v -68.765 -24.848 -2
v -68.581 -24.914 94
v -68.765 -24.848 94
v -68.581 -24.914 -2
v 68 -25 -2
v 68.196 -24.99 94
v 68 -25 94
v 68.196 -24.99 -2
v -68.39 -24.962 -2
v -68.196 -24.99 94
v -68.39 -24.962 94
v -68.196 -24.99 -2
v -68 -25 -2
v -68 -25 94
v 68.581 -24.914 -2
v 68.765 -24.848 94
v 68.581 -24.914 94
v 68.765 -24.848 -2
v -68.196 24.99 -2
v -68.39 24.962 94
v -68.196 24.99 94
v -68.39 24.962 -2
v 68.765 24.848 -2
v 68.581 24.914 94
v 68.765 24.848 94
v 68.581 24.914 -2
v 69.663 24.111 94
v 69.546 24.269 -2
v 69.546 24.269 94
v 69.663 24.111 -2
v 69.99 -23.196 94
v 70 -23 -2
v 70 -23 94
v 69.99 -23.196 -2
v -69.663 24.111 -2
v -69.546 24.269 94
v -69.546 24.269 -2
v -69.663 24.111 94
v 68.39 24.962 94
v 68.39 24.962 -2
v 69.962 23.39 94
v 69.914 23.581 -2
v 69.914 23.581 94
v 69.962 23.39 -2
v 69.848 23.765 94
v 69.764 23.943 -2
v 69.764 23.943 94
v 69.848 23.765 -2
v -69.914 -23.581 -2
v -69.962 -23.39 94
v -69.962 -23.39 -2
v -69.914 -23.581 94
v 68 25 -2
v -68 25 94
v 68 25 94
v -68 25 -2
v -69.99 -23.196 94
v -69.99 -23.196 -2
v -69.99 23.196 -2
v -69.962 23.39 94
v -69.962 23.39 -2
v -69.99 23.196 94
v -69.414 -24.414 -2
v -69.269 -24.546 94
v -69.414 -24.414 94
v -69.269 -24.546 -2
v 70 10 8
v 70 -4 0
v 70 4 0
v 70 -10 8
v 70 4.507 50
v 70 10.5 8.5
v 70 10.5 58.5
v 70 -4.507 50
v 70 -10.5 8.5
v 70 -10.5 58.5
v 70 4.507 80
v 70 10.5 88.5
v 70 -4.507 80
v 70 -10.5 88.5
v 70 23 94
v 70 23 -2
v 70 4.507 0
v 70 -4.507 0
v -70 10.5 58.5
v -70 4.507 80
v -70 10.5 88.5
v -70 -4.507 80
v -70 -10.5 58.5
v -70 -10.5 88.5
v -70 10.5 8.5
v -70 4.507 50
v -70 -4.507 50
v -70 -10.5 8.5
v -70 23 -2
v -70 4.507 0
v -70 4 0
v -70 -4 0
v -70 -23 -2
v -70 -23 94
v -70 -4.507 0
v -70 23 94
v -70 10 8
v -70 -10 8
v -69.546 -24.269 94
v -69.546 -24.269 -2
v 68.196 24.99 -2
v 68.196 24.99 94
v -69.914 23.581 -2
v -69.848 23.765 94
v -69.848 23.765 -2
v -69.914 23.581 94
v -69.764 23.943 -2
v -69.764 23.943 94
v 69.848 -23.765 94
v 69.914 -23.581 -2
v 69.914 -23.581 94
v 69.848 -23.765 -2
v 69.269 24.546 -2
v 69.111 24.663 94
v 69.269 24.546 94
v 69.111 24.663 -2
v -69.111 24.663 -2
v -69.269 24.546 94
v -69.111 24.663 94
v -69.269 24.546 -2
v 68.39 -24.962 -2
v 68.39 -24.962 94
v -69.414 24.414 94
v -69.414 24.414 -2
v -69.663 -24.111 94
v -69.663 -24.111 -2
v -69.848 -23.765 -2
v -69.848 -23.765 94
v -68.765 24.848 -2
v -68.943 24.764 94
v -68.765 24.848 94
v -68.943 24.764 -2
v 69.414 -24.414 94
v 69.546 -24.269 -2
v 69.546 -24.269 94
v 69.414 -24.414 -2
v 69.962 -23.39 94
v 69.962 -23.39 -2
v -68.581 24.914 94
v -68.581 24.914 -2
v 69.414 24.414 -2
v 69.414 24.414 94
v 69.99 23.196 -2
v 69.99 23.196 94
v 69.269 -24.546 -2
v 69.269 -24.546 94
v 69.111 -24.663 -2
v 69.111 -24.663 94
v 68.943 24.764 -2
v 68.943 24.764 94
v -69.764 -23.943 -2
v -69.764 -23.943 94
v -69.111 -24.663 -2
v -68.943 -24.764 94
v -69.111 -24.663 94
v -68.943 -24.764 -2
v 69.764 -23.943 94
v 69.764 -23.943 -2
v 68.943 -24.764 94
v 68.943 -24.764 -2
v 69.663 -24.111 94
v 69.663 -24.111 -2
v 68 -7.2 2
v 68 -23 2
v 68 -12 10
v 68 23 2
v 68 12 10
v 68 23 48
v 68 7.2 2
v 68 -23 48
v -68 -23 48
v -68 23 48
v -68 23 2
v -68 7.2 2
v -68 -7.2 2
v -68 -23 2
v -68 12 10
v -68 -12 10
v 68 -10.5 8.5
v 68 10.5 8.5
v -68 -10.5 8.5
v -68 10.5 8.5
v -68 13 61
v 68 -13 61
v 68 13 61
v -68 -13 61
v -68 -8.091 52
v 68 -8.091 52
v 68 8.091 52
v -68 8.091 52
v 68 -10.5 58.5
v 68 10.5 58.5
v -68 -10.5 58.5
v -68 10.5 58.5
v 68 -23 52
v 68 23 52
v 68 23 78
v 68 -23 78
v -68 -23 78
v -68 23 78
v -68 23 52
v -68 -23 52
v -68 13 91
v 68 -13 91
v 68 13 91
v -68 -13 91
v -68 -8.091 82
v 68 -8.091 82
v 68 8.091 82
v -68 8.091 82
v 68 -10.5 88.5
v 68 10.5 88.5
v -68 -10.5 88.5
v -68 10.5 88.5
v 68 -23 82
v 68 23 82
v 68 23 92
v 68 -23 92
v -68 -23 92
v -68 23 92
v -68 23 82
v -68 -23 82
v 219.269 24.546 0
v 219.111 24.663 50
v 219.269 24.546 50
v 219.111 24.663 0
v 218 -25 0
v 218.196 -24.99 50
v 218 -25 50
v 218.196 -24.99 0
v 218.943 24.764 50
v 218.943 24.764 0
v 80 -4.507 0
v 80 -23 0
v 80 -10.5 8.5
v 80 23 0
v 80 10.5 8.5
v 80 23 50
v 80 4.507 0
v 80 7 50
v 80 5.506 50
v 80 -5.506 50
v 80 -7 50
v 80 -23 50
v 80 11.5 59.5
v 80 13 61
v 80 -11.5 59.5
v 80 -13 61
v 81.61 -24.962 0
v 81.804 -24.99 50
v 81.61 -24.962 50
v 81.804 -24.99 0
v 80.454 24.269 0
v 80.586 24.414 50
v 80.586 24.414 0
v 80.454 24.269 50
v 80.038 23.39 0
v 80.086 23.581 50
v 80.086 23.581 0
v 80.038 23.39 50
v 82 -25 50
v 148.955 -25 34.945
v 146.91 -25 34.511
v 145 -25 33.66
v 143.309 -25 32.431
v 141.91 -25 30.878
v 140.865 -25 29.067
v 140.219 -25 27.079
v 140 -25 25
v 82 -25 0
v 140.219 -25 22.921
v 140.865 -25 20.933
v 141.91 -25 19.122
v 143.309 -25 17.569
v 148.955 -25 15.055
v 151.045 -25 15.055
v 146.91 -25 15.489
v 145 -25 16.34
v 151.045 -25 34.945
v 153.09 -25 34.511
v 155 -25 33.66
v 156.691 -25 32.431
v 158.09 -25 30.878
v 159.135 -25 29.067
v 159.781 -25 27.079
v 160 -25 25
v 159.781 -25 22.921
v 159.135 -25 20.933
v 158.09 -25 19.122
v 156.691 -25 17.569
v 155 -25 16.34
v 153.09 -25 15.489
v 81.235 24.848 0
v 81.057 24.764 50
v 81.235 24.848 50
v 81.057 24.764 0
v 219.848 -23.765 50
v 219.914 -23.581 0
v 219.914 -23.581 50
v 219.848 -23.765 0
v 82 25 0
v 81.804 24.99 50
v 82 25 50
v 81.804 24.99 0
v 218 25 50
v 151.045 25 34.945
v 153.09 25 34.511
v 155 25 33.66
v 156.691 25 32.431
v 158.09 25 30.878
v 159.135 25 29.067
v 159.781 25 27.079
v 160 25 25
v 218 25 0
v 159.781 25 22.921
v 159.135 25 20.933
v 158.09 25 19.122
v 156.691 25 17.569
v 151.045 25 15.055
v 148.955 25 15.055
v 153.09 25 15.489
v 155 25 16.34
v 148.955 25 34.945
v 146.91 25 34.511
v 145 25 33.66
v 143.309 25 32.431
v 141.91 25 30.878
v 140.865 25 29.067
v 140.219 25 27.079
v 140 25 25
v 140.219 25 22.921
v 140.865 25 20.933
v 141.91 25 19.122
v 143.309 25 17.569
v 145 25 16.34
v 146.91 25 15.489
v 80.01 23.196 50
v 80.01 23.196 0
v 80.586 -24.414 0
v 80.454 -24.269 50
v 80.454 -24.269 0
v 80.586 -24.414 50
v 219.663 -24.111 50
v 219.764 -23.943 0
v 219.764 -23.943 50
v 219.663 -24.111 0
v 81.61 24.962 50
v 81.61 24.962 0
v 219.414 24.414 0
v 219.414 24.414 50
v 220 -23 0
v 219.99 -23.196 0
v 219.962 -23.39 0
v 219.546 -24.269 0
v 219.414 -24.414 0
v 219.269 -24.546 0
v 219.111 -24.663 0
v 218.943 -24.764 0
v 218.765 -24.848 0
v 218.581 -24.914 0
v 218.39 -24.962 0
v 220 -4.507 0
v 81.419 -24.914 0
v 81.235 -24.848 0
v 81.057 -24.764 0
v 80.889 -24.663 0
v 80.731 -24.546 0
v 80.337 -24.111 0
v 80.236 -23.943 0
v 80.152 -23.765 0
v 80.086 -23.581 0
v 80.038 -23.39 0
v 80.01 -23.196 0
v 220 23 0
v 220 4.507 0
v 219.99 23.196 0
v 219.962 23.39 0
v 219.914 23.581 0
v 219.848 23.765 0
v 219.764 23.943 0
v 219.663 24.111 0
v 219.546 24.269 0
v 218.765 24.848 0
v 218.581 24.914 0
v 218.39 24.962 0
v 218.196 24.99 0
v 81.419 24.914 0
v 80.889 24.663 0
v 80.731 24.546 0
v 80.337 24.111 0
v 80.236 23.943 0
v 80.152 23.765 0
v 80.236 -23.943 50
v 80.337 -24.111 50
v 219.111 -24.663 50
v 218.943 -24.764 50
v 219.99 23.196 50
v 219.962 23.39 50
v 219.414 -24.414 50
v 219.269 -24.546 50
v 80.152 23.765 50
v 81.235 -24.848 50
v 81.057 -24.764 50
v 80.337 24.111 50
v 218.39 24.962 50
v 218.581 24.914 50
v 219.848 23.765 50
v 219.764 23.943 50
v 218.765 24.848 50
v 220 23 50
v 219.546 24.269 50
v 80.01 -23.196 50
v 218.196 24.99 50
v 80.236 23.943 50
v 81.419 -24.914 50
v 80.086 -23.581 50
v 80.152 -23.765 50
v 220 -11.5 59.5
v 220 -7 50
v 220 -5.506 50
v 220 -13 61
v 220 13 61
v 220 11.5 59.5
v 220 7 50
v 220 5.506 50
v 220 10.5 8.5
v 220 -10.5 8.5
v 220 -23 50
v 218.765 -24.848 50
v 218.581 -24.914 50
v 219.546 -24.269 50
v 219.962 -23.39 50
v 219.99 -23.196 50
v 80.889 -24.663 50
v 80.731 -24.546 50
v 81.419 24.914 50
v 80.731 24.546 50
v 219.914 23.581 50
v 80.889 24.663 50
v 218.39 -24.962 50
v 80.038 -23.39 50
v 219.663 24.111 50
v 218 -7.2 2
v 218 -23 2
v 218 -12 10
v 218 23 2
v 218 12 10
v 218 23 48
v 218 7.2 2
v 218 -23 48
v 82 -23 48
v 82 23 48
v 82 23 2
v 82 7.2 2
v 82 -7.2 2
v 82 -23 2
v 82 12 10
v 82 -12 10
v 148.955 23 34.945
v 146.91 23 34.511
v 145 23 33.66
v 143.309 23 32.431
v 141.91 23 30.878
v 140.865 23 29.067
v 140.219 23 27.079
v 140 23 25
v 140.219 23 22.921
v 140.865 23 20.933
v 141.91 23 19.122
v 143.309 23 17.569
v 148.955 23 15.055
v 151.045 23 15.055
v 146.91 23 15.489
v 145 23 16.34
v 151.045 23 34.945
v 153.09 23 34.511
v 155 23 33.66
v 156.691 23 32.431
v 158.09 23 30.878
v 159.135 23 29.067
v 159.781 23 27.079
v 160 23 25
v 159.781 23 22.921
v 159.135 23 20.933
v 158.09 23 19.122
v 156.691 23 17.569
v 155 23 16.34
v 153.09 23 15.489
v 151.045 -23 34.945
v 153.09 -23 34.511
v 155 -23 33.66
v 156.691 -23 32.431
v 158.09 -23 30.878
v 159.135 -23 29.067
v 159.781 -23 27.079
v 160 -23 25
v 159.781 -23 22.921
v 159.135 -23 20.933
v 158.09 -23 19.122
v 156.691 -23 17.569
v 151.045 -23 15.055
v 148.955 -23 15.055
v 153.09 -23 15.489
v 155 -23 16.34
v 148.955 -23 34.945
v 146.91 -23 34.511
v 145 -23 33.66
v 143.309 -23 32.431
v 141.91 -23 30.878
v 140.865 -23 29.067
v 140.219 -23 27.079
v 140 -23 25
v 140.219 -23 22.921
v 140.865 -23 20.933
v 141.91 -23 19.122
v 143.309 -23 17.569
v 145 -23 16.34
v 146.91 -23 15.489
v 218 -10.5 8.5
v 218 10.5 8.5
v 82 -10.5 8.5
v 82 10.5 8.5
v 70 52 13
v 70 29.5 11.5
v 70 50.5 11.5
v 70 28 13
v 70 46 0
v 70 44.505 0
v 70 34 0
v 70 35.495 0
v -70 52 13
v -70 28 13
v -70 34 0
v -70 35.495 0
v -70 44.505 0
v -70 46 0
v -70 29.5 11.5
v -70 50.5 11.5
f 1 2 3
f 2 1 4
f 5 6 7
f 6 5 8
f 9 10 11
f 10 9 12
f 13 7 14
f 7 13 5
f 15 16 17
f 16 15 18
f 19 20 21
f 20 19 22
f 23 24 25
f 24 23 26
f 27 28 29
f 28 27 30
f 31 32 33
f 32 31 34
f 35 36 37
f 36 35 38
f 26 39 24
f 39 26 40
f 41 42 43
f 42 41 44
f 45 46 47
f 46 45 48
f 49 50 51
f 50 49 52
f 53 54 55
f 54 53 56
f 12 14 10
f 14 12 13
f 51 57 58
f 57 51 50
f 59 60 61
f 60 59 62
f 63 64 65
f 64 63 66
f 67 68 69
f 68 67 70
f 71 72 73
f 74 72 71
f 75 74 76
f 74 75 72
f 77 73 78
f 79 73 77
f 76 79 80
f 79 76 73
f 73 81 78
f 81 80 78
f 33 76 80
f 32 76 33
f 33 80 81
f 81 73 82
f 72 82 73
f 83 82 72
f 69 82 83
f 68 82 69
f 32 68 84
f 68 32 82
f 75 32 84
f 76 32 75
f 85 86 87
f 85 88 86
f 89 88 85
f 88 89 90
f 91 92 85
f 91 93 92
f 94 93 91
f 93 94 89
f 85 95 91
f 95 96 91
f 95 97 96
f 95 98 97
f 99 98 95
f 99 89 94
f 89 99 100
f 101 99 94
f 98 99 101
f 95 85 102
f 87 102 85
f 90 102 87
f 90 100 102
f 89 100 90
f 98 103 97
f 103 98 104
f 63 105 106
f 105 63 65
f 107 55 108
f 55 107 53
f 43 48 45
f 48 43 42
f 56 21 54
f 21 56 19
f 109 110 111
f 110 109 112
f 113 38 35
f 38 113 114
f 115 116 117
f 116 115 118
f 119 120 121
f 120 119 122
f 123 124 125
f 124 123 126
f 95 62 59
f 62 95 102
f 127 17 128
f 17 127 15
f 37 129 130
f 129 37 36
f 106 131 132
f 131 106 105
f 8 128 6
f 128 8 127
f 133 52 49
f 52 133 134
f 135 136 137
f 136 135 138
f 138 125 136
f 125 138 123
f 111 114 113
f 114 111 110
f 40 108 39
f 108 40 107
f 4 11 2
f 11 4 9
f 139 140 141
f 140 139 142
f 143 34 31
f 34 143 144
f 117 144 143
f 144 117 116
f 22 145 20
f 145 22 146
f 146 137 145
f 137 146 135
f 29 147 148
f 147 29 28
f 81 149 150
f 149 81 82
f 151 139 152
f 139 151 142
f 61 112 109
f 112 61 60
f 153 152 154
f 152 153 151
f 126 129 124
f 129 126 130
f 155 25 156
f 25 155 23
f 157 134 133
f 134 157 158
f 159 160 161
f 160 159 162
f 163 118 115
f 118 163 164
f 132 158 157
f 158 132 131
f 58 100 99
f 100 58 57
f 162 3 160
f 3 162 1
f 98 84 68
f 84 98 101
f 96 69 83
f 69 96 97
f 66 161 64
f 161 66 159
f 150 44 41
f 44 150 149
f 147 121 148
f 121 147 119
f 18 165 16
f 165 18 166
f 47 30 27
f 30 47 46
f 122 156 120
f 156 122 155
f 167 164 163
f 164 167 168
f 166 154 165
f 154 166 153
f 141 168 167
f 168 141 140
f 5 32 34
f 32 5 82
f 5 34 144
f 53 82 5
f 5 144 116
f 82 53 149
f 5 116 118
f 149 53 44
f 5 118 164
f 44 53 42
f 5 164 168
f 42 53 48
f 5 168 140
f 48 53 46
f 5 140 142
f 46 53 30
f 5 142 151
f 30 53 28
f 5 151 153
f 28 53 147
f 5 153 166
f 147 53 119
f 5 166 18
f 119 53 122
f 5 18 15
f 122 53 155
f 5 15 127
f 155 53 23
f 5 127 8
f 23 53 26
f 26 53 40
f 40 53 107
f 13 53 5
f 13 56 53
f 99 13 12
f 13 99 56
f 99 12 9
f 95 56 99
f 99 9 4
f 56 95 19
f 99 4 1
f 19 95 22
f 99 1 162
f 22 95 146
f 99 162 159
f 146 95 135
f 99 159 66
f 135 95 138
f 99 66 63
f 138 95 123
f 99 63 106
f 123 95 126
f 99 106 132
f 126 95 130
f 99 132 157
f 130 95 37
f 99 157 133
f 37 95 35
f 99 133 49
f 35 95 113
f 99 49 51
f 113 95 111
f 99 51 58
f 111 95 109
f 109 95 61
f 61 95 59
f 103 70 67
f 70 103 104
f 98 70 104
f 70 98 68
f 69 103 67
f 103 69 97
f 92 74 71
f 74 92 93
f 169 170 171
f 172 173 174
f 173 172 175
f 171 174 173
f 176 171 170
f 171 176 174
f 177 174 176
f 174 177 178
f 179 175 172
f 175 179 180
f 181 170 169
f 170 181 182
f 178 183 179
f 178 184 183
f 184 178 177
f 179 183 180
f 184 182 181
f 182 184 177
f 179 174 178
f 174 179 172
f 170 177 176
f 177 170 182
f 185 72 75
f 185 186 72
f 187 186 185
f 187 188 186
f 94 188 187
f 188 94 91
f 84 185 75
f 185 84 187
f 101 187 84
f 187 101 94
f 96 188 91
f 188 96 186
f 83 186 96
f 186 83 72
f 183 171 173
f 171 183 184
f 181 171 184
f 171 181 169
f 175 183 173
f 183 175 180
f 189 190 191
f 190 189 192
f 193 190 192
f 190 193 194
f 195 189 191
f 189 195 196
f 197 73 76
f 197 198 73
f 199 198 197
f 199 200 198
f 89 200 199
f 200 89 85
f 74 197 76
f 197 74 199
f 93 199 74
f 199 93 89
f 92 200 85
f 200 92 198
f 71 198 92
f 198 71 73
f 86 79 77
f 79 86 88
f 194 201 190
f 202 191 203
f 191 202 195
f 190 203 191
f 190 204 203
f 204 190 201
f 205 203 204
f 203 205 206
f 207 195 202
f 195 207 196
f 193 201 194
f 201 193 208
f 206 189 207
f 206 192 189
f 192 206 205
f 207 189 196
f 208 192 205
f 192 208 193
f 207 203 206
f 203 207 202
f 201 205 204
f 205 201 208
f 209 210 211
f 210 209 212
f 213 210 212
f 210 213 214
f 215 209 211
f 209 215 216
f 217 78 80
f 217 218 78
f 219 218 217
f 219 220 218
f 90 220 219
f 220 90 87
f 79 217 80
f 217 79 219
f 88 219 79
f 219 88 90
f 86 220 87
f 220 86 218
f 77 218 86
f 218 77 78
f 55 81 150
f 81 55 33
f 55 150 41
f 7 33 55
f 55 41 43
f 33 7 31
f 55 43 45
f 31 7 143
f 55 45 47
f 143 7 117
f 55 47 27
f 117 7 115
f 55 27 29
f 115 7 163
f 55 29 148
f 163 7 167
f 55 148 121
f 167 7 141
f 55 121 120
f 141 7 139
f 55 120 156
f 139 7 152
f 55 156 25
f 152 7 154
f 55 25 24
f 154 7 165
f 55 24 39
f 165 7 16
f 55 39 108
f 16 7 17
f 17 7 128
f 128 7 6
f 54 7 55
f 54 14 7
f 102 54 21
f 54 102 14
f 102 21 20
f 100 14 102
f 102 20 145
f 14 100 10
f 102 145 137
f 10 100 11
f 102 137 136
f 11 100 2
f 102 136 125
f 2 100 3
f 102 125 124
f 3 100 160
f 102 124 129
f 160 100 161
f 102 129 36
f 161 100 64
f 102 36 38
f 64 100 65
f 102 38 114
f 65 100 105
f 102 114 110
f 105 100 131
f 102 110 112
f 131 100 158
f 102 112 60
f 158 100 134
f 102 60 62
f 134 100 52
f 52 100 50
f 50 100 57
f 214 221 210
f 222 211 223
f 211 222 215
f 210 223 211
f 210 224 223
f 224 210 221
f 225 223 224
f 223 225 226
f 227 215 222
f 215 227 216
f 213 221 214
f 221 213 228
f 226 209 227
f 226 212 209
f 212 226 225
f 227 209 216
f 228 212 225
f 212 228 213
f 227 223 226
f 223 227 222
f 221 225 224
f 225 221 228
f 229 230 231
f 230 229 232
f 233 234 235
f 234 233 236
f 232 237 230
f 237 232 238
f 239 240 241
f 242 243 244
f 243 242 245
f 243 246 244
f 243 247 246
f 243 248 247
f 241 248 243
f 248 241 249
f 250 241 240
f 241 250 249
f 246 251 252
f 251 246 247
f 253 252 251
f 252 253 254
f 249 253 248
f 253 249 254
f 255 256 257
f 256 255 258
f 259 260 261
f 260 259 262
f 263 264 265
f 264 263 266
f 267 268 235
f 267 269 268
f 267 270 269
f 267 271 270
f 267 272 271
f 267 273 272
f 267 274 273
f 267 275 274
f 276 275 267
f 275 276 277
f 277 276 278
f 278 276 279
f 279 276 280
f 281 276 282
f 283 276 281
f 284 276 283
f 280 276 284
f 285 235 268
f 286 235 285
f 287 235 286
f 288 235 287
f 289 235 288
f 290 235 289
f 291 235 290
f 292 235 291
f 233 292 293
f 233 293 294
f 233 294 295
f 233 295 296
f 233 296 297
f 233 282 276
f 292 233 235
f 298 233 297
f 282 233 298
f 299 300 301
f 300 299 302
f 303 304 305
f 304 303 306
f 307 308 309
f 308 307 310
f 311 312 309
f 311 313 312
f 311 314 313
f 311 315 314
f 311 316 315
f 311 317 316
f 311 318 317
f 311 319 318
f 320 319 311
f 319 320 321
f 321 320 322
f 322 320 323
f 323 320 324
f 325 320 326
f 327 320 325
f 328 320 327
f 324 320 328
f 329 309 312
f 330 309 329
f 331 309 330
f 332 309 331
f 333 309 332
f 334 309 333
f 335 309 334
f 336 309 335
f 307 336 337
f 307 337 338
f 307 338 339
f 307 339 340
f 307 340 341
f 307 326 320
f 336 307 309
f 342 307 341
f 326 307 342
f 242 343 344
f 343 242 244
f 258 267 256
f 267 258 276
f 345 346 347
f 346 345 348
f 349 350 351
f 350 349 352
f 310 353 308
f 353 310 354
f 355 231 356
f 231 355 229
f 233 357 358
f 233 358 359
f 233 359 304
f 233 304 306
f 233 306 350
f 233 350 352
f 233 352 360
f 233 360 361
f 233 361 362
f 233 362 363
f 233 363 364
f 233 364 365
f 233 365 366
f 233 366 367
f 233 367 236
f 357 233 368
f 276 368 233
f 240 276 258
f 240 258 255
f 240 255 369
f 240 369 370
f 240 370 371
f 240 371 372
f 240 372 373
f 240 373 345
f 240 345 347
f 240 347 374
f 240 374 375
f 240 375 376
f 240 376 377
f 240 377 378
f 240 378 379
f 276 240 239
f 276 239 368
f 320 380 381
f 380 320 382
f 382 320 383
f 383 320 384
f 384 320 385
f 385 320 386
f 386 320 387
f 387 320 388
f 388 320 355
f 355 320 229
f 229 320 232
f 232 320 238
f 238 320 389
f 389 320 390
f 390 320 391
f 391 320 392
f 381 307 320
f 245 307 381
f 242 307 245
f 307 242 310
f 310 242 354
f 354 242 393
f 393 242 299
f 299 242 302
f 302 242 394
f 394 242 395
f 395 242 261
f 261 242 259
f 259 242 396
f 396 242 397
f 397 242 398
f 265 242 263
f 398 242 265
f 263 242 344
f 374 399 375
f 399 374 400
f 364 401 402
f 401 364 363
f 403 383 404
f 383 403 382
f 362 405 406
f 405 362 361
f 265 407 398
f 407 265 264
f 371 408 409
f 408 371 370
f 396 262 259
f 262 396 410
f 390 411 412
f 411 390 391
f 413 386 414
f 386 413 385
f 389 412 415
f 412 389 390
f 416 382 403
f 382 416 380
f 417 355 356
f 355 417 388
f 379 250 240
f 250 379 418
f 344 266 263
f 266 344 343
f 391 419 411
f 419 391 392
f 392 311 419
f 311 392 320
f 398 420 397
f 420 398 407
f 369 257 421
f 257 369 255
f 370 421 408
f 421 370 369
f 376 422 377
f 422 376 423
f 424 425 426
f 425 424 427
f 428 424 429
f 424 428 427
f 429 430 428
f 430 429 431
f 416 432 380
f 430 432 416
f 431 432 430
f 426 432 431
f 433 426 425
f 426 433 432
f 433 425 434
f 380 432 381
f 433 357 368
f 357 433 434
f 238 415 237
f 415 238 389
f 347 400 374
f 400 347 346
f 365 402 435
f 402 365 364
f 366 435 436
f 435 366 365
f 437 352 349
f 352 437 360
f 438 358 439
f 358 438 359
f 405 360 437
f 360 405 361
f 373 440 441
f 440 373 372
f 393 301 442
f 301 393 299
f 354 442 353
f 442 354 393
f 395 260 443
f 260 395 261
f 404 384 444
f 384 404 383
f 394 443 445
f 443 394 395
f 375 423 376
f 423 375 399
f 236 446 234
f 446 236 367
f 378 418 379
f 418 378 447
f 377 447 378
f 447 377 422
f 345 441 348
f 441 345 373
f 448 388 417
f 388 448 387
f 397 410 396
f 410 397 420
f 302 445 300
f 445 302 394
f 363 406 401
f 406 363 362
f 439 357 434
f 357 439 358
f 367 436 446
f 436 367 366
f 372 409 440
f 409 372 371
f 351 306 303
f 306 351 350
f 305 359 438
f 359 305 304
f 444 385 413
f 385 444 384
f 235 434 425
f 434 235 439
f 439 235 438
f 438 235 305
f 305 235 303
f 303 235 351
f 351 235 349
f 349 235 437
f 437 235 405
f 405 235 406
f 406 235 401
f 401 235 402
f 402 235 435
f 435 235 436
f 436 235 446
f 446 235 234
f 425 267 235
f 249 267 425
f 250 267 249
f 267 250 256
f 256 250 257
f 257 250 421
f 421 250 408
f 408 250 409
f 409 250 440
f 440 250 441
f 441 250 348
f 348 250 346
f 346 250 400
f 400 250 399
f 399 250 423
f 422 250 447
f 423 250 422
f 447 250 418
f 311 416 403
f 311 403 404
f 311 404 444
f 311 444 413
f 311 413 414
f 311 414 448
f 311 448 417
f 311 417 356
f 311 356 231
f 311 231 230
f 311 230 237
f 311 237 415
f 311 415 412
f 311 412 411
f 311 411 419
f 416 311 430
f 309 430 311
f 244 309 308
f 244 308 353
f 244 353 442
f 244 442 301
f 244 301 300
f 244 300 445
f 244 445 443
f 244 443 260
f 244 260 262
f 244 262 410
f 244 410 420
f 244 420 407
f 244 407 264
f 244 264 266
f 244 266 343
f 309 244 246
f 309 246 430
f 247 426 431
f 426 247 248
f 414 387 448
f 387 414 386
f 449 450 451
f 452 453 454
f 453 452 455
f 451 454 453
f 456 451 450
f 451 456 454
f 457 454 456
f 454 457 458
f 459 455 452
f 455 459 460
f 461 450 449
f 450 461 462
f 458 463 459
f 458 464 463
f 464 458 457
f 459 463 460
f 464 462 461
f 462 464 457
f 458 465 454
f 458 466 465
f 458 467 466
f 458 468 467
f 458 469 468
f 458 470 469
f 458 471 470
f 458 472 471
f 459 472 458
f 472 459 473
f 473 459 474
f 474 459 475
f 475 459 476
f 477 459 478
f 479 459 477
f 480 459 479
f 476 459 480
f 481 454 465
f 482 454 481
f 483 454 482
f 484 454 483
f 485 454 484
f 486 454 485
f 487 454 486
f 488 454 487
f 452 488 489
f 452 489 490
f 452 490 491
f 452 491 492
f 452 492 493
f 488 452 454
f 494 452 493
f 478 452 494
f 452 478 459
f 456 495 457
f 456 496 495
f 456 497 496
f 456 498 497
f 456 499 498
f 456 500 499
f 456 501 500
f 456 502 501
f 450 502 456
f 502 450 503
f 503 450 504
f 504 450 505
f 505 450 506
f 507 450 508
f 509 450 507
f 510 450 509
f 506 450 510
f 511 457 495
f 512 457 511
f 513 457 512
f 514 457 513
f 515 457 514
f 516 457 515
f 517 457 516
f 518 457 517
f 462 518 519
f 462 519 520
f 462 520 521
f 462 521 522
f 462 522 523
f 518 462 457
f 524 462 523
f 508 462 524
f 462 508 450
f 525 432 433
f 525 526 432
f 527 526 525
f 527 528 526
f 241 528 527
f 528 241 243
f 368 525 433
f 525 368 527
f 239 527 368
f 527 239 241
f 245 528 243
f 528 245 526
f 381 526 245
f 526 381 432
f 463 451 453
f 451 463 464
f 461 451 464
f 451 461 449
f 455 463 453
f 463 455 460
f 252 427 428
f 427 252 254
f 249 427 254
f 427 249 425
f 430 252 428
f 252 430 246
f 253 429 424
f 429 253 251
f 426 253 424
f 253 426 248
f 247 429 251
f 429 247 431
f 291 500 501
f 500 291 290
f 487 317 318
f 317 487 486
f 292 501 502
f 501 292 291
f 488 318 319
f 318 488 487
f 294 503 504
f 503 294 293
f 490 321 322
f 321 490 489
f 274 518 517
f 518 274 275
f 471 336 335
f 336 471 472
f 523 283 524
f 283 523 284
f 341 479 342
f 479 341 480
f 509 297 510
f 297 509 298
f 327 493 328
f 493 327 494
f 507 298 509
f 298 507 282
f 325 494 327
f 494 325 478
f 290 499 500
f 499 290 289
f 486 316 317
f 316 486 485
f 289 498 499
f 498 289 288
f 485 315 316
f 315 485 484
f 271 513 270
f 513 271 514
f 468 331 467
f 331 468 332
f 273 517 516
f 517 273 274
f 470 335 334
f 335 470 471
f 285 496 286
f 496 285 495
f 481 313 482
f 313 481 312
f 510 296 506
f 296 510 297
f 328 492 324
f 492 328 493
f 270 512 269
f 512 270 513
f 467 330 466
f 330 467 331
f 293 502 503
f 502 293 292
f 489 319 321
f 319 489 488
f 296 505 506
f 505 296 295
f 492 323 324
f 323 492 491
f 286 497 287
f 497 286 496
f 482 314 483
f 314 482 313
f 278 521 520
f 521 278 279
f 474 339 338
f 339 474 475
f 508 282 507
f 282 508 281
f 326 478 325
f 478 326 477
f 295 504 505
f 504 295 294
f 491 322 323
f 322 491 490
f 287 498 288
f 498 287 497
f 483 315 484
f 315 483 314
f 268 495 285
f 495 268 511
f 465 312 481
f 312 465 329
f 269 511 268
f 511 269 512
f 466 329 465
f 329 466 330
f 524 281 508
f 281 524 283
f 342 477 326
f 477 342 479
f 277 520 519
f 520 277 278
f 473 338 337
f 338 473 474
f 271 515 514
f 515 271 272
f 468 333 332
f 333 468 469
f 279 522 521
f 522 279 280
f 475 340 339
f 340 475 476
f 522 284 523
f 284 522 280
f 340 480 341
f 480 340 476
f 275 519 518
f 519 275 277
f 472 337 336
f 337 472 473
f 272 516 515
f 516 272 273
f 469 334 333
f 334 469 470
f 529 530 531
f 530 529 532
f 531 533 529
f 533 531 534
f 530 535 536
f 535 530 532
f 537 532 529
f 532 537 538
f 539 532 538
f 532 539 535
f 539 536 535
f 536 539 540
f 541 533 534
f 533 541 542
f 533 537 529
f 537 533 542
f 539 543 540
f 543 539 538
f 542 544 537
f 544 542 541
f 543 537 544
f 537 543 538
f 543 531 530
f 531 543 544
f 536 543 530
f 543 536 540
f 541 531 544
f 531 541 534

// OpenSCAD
// Put Affero License here
// TODO FOR JAHNAVI:
// 1. Fix the narrowness in the wall thickness
// 2. Add a slot on top where the mail dovetail is.
// 3. Make all the dovetail consistently resizable (make sure it all fits)

// TODO:
// 1) Add Licence premable
// 1.5) Make boxes instead of solid cubes - Jahanavi (DONE)
// 2) Cut the female dovetial -- 
// 3) Add parameterizes margins (0.5 mm)
// 4) Make it two dovetails instead of 1
// 5) Add an empty "chamber" for the cables
// 6) Add a "bottom plate" that does not have a female dovetail
// 7) Add a "top plate" that does not have a male dovetail
// 8) Add a "generic face plate" as a union-izable module
// 9) Add threaded rod holes


// Initial size configuration

depth_mm = 50;
width_mm = 140;
RENDER = 1;
dovetial_margin_mm = 0.5;
knife_margin_mm = 0.01;
wall_mm = 2;
cap_margin = 6;
corner_radius_mm = 2;

dt_height = 8; // Height is difference from flat top to base.
dt_width = 10;
dt_narrow_width = 4;


USE_RENDER_KNIFE = 0;

module dovetail(dt_h = dt_height,dt_w = dt_width, dt_n_w = dt_narrow_width) {
    y = dt_w;
    y_in = dt_n_w;
    z = dt_h;
    points = [[0,y_in],[z,y],[z,-y],[0,-y_in]];
    rotate([0,-90,0])
    linear_extrude(height = width_mm,center = true)
    polygon(points);
}


module female_dovetail_knife(dt_h = dt_height,dt_w = dt_width, dt_n_w = dt_narrow_width) {

    y = dt_w + dovetial_margin_mm;
    y_in = dt_n_w + dovetial_margin_mm;
    z = dt_h + dovetial_margin_mm;

    points = [
        [0-knife_margin_mm, y_in],
        [z, y],
        [z,-y],
        [0-knife_margin_mm,-y_in]
    ];

    rotate([0,-90,0])
        linear_extrude(height = width_mm + 2, center = true)
            polygon(points);
}

module dove_tail_shell(dt_h = dt_height,dt_w = dt_width, dt_n_w = dt_narrow_width) {
    y = dt_w + wall_mm;
    y_in = dt_n_w + wall_mm;
    z = dt_h + wall_mm;

    points = [
       [0, y_in],
       [z, y],
       [z,-y],
       [0,-y_in]
    ];
    
    rotate([0,-90,0])
    difference() {
        linear_extrude(height = width_mm, center = true)
        polygon(points);
        rotate([0,90,0])
        female_dovetail_knife(dt_h,dt_w,dt_n_w);
    }
}



module speaker_component() {
    difference() {
        generic_component(50);
        translate([0,0,25])
        rotate([90,0,0])
        cylinder(100,10,10,center=true);
    }
}

// ---------------------------------------------------------
// Chamfered exterior corners
//
// Chamfers the 4 vertical outside corners only.
// Top and bottom faces remain square for mating.
// ---------------------------------------------------------
module vertical_corner_chamfer(
 
    size_x,
    size_y,
    size_z,
    corner_radius_mm,
    fn = 64
) {

    linear_extrude(height = size_z)
        offset(r = corner_radius_mm, $fn = fn)
            offset(delta = -corner_radius_mm)
                square(
                    [
                        size_x,
                        size_y
                    ],
                    center = true
                );
}



module top_end_plate(cap_height = dt_height + cap_margin) {

    chamfer_mm = 2;

    difference() {

        
        // Main outer body
        // Vertical outside corners are chamfered.
        // Bottom mating face remains square.
       
        vertical_corner_chamfer(
            width_mm,
            depth_mm,
            cap_height,
            chamfer_mm
        );

  
        // Interior cavity
        // Leaves 2 mm walls on the sides
        // and a 2 mm solid top surface
        translate([
            -width_mm/2 + wall_mm,
            -depth_mm/2 + wall_mm,
            wall_mm
        ])
        cube([
            width_mm - 2*wall_mm,
            depth_mm - 2*wall_mm,
            cap_height - 2*wall_mm
        ]);
        
        // Female dovetail socket
        female_dovetail_knife(
            dt_height,
            dt_width,
            dt_narrow_width
        );
    }

   
    // Female dovetail shell
 
    dove_tail_shell(dt_height);
}

module bottom_end_plate() {

    cap_height = wall_mm;
    chamfer_mm = 2;

    union() {

        // 
        // Bottom cap with chamfered vertical outside corners
        // 
        translate([0,0,-cap_height])
        vertical_corner_chamfer(
            width_mm,
            depth_mm,
            cap_height,
            chamfer_mm
        );

        // 
        // Male dovetail
        //
        dovetail(
            dt_height,
            dt_width,
            dt_narrow_width
        );
    }
}

module blank_face_plate() {
}




module generic_component (height_mm) {

    difference() {

        // Main body with chamfered vertical outside corners
        vertical_corner_chamfer(
            width_mm,
            depth_mm,
            height_mm,
            2
        );

        // Interior cavity
        translate([
            -width_mm/2 + wall_mm,
            -depth_mm/2 + wall_mm,
            wall_mm
        ])
        cube([
            width_mm - 2*wall_mm,
            depth_mm - 2*wall_mm,
            height_mm - 2*wall_mm
        ]);

        // Female dovetail socket
        female_dovetail_knife(
            dt_height,
            dt_width,
            dt_narrow_width
        );
    }

    // Female dovetail shell
    dove_tail_shell(dt_height);

    // Male dovetail on top
    translate([0,0,height_mm])
        dove_tail_shell(
            dt_height+1,
            dt_width+1,
            dt_narrow_width+1
        );
}



// Example: Create a working system by composing components
module render() {
    if (RENDER) {       
                // Bottom cap
        color("gray")
        bottom_end_plate();

        // First component
        color("blue")
        generic_component(50);

        // Second component
        translate([0,0,50])
        color("green")
        generic_component(30);

        // Top cap
        translate([0,0,50+30
        ])
        color("gray")
        top_end_plate();

        // Existing examples
        translate([150,0,0])
        color("red")
        speaker_component();

        color("green")
        translate([0,40,0])
        dove_tail_shell(dt_height+3);
    }
}

if (USE_RENDER_KNIFE) {
    difference() {
        render();
        translate([300/2,0,0])
        cube([300,300,300],center=true);
    }
} else {
    render();
}
